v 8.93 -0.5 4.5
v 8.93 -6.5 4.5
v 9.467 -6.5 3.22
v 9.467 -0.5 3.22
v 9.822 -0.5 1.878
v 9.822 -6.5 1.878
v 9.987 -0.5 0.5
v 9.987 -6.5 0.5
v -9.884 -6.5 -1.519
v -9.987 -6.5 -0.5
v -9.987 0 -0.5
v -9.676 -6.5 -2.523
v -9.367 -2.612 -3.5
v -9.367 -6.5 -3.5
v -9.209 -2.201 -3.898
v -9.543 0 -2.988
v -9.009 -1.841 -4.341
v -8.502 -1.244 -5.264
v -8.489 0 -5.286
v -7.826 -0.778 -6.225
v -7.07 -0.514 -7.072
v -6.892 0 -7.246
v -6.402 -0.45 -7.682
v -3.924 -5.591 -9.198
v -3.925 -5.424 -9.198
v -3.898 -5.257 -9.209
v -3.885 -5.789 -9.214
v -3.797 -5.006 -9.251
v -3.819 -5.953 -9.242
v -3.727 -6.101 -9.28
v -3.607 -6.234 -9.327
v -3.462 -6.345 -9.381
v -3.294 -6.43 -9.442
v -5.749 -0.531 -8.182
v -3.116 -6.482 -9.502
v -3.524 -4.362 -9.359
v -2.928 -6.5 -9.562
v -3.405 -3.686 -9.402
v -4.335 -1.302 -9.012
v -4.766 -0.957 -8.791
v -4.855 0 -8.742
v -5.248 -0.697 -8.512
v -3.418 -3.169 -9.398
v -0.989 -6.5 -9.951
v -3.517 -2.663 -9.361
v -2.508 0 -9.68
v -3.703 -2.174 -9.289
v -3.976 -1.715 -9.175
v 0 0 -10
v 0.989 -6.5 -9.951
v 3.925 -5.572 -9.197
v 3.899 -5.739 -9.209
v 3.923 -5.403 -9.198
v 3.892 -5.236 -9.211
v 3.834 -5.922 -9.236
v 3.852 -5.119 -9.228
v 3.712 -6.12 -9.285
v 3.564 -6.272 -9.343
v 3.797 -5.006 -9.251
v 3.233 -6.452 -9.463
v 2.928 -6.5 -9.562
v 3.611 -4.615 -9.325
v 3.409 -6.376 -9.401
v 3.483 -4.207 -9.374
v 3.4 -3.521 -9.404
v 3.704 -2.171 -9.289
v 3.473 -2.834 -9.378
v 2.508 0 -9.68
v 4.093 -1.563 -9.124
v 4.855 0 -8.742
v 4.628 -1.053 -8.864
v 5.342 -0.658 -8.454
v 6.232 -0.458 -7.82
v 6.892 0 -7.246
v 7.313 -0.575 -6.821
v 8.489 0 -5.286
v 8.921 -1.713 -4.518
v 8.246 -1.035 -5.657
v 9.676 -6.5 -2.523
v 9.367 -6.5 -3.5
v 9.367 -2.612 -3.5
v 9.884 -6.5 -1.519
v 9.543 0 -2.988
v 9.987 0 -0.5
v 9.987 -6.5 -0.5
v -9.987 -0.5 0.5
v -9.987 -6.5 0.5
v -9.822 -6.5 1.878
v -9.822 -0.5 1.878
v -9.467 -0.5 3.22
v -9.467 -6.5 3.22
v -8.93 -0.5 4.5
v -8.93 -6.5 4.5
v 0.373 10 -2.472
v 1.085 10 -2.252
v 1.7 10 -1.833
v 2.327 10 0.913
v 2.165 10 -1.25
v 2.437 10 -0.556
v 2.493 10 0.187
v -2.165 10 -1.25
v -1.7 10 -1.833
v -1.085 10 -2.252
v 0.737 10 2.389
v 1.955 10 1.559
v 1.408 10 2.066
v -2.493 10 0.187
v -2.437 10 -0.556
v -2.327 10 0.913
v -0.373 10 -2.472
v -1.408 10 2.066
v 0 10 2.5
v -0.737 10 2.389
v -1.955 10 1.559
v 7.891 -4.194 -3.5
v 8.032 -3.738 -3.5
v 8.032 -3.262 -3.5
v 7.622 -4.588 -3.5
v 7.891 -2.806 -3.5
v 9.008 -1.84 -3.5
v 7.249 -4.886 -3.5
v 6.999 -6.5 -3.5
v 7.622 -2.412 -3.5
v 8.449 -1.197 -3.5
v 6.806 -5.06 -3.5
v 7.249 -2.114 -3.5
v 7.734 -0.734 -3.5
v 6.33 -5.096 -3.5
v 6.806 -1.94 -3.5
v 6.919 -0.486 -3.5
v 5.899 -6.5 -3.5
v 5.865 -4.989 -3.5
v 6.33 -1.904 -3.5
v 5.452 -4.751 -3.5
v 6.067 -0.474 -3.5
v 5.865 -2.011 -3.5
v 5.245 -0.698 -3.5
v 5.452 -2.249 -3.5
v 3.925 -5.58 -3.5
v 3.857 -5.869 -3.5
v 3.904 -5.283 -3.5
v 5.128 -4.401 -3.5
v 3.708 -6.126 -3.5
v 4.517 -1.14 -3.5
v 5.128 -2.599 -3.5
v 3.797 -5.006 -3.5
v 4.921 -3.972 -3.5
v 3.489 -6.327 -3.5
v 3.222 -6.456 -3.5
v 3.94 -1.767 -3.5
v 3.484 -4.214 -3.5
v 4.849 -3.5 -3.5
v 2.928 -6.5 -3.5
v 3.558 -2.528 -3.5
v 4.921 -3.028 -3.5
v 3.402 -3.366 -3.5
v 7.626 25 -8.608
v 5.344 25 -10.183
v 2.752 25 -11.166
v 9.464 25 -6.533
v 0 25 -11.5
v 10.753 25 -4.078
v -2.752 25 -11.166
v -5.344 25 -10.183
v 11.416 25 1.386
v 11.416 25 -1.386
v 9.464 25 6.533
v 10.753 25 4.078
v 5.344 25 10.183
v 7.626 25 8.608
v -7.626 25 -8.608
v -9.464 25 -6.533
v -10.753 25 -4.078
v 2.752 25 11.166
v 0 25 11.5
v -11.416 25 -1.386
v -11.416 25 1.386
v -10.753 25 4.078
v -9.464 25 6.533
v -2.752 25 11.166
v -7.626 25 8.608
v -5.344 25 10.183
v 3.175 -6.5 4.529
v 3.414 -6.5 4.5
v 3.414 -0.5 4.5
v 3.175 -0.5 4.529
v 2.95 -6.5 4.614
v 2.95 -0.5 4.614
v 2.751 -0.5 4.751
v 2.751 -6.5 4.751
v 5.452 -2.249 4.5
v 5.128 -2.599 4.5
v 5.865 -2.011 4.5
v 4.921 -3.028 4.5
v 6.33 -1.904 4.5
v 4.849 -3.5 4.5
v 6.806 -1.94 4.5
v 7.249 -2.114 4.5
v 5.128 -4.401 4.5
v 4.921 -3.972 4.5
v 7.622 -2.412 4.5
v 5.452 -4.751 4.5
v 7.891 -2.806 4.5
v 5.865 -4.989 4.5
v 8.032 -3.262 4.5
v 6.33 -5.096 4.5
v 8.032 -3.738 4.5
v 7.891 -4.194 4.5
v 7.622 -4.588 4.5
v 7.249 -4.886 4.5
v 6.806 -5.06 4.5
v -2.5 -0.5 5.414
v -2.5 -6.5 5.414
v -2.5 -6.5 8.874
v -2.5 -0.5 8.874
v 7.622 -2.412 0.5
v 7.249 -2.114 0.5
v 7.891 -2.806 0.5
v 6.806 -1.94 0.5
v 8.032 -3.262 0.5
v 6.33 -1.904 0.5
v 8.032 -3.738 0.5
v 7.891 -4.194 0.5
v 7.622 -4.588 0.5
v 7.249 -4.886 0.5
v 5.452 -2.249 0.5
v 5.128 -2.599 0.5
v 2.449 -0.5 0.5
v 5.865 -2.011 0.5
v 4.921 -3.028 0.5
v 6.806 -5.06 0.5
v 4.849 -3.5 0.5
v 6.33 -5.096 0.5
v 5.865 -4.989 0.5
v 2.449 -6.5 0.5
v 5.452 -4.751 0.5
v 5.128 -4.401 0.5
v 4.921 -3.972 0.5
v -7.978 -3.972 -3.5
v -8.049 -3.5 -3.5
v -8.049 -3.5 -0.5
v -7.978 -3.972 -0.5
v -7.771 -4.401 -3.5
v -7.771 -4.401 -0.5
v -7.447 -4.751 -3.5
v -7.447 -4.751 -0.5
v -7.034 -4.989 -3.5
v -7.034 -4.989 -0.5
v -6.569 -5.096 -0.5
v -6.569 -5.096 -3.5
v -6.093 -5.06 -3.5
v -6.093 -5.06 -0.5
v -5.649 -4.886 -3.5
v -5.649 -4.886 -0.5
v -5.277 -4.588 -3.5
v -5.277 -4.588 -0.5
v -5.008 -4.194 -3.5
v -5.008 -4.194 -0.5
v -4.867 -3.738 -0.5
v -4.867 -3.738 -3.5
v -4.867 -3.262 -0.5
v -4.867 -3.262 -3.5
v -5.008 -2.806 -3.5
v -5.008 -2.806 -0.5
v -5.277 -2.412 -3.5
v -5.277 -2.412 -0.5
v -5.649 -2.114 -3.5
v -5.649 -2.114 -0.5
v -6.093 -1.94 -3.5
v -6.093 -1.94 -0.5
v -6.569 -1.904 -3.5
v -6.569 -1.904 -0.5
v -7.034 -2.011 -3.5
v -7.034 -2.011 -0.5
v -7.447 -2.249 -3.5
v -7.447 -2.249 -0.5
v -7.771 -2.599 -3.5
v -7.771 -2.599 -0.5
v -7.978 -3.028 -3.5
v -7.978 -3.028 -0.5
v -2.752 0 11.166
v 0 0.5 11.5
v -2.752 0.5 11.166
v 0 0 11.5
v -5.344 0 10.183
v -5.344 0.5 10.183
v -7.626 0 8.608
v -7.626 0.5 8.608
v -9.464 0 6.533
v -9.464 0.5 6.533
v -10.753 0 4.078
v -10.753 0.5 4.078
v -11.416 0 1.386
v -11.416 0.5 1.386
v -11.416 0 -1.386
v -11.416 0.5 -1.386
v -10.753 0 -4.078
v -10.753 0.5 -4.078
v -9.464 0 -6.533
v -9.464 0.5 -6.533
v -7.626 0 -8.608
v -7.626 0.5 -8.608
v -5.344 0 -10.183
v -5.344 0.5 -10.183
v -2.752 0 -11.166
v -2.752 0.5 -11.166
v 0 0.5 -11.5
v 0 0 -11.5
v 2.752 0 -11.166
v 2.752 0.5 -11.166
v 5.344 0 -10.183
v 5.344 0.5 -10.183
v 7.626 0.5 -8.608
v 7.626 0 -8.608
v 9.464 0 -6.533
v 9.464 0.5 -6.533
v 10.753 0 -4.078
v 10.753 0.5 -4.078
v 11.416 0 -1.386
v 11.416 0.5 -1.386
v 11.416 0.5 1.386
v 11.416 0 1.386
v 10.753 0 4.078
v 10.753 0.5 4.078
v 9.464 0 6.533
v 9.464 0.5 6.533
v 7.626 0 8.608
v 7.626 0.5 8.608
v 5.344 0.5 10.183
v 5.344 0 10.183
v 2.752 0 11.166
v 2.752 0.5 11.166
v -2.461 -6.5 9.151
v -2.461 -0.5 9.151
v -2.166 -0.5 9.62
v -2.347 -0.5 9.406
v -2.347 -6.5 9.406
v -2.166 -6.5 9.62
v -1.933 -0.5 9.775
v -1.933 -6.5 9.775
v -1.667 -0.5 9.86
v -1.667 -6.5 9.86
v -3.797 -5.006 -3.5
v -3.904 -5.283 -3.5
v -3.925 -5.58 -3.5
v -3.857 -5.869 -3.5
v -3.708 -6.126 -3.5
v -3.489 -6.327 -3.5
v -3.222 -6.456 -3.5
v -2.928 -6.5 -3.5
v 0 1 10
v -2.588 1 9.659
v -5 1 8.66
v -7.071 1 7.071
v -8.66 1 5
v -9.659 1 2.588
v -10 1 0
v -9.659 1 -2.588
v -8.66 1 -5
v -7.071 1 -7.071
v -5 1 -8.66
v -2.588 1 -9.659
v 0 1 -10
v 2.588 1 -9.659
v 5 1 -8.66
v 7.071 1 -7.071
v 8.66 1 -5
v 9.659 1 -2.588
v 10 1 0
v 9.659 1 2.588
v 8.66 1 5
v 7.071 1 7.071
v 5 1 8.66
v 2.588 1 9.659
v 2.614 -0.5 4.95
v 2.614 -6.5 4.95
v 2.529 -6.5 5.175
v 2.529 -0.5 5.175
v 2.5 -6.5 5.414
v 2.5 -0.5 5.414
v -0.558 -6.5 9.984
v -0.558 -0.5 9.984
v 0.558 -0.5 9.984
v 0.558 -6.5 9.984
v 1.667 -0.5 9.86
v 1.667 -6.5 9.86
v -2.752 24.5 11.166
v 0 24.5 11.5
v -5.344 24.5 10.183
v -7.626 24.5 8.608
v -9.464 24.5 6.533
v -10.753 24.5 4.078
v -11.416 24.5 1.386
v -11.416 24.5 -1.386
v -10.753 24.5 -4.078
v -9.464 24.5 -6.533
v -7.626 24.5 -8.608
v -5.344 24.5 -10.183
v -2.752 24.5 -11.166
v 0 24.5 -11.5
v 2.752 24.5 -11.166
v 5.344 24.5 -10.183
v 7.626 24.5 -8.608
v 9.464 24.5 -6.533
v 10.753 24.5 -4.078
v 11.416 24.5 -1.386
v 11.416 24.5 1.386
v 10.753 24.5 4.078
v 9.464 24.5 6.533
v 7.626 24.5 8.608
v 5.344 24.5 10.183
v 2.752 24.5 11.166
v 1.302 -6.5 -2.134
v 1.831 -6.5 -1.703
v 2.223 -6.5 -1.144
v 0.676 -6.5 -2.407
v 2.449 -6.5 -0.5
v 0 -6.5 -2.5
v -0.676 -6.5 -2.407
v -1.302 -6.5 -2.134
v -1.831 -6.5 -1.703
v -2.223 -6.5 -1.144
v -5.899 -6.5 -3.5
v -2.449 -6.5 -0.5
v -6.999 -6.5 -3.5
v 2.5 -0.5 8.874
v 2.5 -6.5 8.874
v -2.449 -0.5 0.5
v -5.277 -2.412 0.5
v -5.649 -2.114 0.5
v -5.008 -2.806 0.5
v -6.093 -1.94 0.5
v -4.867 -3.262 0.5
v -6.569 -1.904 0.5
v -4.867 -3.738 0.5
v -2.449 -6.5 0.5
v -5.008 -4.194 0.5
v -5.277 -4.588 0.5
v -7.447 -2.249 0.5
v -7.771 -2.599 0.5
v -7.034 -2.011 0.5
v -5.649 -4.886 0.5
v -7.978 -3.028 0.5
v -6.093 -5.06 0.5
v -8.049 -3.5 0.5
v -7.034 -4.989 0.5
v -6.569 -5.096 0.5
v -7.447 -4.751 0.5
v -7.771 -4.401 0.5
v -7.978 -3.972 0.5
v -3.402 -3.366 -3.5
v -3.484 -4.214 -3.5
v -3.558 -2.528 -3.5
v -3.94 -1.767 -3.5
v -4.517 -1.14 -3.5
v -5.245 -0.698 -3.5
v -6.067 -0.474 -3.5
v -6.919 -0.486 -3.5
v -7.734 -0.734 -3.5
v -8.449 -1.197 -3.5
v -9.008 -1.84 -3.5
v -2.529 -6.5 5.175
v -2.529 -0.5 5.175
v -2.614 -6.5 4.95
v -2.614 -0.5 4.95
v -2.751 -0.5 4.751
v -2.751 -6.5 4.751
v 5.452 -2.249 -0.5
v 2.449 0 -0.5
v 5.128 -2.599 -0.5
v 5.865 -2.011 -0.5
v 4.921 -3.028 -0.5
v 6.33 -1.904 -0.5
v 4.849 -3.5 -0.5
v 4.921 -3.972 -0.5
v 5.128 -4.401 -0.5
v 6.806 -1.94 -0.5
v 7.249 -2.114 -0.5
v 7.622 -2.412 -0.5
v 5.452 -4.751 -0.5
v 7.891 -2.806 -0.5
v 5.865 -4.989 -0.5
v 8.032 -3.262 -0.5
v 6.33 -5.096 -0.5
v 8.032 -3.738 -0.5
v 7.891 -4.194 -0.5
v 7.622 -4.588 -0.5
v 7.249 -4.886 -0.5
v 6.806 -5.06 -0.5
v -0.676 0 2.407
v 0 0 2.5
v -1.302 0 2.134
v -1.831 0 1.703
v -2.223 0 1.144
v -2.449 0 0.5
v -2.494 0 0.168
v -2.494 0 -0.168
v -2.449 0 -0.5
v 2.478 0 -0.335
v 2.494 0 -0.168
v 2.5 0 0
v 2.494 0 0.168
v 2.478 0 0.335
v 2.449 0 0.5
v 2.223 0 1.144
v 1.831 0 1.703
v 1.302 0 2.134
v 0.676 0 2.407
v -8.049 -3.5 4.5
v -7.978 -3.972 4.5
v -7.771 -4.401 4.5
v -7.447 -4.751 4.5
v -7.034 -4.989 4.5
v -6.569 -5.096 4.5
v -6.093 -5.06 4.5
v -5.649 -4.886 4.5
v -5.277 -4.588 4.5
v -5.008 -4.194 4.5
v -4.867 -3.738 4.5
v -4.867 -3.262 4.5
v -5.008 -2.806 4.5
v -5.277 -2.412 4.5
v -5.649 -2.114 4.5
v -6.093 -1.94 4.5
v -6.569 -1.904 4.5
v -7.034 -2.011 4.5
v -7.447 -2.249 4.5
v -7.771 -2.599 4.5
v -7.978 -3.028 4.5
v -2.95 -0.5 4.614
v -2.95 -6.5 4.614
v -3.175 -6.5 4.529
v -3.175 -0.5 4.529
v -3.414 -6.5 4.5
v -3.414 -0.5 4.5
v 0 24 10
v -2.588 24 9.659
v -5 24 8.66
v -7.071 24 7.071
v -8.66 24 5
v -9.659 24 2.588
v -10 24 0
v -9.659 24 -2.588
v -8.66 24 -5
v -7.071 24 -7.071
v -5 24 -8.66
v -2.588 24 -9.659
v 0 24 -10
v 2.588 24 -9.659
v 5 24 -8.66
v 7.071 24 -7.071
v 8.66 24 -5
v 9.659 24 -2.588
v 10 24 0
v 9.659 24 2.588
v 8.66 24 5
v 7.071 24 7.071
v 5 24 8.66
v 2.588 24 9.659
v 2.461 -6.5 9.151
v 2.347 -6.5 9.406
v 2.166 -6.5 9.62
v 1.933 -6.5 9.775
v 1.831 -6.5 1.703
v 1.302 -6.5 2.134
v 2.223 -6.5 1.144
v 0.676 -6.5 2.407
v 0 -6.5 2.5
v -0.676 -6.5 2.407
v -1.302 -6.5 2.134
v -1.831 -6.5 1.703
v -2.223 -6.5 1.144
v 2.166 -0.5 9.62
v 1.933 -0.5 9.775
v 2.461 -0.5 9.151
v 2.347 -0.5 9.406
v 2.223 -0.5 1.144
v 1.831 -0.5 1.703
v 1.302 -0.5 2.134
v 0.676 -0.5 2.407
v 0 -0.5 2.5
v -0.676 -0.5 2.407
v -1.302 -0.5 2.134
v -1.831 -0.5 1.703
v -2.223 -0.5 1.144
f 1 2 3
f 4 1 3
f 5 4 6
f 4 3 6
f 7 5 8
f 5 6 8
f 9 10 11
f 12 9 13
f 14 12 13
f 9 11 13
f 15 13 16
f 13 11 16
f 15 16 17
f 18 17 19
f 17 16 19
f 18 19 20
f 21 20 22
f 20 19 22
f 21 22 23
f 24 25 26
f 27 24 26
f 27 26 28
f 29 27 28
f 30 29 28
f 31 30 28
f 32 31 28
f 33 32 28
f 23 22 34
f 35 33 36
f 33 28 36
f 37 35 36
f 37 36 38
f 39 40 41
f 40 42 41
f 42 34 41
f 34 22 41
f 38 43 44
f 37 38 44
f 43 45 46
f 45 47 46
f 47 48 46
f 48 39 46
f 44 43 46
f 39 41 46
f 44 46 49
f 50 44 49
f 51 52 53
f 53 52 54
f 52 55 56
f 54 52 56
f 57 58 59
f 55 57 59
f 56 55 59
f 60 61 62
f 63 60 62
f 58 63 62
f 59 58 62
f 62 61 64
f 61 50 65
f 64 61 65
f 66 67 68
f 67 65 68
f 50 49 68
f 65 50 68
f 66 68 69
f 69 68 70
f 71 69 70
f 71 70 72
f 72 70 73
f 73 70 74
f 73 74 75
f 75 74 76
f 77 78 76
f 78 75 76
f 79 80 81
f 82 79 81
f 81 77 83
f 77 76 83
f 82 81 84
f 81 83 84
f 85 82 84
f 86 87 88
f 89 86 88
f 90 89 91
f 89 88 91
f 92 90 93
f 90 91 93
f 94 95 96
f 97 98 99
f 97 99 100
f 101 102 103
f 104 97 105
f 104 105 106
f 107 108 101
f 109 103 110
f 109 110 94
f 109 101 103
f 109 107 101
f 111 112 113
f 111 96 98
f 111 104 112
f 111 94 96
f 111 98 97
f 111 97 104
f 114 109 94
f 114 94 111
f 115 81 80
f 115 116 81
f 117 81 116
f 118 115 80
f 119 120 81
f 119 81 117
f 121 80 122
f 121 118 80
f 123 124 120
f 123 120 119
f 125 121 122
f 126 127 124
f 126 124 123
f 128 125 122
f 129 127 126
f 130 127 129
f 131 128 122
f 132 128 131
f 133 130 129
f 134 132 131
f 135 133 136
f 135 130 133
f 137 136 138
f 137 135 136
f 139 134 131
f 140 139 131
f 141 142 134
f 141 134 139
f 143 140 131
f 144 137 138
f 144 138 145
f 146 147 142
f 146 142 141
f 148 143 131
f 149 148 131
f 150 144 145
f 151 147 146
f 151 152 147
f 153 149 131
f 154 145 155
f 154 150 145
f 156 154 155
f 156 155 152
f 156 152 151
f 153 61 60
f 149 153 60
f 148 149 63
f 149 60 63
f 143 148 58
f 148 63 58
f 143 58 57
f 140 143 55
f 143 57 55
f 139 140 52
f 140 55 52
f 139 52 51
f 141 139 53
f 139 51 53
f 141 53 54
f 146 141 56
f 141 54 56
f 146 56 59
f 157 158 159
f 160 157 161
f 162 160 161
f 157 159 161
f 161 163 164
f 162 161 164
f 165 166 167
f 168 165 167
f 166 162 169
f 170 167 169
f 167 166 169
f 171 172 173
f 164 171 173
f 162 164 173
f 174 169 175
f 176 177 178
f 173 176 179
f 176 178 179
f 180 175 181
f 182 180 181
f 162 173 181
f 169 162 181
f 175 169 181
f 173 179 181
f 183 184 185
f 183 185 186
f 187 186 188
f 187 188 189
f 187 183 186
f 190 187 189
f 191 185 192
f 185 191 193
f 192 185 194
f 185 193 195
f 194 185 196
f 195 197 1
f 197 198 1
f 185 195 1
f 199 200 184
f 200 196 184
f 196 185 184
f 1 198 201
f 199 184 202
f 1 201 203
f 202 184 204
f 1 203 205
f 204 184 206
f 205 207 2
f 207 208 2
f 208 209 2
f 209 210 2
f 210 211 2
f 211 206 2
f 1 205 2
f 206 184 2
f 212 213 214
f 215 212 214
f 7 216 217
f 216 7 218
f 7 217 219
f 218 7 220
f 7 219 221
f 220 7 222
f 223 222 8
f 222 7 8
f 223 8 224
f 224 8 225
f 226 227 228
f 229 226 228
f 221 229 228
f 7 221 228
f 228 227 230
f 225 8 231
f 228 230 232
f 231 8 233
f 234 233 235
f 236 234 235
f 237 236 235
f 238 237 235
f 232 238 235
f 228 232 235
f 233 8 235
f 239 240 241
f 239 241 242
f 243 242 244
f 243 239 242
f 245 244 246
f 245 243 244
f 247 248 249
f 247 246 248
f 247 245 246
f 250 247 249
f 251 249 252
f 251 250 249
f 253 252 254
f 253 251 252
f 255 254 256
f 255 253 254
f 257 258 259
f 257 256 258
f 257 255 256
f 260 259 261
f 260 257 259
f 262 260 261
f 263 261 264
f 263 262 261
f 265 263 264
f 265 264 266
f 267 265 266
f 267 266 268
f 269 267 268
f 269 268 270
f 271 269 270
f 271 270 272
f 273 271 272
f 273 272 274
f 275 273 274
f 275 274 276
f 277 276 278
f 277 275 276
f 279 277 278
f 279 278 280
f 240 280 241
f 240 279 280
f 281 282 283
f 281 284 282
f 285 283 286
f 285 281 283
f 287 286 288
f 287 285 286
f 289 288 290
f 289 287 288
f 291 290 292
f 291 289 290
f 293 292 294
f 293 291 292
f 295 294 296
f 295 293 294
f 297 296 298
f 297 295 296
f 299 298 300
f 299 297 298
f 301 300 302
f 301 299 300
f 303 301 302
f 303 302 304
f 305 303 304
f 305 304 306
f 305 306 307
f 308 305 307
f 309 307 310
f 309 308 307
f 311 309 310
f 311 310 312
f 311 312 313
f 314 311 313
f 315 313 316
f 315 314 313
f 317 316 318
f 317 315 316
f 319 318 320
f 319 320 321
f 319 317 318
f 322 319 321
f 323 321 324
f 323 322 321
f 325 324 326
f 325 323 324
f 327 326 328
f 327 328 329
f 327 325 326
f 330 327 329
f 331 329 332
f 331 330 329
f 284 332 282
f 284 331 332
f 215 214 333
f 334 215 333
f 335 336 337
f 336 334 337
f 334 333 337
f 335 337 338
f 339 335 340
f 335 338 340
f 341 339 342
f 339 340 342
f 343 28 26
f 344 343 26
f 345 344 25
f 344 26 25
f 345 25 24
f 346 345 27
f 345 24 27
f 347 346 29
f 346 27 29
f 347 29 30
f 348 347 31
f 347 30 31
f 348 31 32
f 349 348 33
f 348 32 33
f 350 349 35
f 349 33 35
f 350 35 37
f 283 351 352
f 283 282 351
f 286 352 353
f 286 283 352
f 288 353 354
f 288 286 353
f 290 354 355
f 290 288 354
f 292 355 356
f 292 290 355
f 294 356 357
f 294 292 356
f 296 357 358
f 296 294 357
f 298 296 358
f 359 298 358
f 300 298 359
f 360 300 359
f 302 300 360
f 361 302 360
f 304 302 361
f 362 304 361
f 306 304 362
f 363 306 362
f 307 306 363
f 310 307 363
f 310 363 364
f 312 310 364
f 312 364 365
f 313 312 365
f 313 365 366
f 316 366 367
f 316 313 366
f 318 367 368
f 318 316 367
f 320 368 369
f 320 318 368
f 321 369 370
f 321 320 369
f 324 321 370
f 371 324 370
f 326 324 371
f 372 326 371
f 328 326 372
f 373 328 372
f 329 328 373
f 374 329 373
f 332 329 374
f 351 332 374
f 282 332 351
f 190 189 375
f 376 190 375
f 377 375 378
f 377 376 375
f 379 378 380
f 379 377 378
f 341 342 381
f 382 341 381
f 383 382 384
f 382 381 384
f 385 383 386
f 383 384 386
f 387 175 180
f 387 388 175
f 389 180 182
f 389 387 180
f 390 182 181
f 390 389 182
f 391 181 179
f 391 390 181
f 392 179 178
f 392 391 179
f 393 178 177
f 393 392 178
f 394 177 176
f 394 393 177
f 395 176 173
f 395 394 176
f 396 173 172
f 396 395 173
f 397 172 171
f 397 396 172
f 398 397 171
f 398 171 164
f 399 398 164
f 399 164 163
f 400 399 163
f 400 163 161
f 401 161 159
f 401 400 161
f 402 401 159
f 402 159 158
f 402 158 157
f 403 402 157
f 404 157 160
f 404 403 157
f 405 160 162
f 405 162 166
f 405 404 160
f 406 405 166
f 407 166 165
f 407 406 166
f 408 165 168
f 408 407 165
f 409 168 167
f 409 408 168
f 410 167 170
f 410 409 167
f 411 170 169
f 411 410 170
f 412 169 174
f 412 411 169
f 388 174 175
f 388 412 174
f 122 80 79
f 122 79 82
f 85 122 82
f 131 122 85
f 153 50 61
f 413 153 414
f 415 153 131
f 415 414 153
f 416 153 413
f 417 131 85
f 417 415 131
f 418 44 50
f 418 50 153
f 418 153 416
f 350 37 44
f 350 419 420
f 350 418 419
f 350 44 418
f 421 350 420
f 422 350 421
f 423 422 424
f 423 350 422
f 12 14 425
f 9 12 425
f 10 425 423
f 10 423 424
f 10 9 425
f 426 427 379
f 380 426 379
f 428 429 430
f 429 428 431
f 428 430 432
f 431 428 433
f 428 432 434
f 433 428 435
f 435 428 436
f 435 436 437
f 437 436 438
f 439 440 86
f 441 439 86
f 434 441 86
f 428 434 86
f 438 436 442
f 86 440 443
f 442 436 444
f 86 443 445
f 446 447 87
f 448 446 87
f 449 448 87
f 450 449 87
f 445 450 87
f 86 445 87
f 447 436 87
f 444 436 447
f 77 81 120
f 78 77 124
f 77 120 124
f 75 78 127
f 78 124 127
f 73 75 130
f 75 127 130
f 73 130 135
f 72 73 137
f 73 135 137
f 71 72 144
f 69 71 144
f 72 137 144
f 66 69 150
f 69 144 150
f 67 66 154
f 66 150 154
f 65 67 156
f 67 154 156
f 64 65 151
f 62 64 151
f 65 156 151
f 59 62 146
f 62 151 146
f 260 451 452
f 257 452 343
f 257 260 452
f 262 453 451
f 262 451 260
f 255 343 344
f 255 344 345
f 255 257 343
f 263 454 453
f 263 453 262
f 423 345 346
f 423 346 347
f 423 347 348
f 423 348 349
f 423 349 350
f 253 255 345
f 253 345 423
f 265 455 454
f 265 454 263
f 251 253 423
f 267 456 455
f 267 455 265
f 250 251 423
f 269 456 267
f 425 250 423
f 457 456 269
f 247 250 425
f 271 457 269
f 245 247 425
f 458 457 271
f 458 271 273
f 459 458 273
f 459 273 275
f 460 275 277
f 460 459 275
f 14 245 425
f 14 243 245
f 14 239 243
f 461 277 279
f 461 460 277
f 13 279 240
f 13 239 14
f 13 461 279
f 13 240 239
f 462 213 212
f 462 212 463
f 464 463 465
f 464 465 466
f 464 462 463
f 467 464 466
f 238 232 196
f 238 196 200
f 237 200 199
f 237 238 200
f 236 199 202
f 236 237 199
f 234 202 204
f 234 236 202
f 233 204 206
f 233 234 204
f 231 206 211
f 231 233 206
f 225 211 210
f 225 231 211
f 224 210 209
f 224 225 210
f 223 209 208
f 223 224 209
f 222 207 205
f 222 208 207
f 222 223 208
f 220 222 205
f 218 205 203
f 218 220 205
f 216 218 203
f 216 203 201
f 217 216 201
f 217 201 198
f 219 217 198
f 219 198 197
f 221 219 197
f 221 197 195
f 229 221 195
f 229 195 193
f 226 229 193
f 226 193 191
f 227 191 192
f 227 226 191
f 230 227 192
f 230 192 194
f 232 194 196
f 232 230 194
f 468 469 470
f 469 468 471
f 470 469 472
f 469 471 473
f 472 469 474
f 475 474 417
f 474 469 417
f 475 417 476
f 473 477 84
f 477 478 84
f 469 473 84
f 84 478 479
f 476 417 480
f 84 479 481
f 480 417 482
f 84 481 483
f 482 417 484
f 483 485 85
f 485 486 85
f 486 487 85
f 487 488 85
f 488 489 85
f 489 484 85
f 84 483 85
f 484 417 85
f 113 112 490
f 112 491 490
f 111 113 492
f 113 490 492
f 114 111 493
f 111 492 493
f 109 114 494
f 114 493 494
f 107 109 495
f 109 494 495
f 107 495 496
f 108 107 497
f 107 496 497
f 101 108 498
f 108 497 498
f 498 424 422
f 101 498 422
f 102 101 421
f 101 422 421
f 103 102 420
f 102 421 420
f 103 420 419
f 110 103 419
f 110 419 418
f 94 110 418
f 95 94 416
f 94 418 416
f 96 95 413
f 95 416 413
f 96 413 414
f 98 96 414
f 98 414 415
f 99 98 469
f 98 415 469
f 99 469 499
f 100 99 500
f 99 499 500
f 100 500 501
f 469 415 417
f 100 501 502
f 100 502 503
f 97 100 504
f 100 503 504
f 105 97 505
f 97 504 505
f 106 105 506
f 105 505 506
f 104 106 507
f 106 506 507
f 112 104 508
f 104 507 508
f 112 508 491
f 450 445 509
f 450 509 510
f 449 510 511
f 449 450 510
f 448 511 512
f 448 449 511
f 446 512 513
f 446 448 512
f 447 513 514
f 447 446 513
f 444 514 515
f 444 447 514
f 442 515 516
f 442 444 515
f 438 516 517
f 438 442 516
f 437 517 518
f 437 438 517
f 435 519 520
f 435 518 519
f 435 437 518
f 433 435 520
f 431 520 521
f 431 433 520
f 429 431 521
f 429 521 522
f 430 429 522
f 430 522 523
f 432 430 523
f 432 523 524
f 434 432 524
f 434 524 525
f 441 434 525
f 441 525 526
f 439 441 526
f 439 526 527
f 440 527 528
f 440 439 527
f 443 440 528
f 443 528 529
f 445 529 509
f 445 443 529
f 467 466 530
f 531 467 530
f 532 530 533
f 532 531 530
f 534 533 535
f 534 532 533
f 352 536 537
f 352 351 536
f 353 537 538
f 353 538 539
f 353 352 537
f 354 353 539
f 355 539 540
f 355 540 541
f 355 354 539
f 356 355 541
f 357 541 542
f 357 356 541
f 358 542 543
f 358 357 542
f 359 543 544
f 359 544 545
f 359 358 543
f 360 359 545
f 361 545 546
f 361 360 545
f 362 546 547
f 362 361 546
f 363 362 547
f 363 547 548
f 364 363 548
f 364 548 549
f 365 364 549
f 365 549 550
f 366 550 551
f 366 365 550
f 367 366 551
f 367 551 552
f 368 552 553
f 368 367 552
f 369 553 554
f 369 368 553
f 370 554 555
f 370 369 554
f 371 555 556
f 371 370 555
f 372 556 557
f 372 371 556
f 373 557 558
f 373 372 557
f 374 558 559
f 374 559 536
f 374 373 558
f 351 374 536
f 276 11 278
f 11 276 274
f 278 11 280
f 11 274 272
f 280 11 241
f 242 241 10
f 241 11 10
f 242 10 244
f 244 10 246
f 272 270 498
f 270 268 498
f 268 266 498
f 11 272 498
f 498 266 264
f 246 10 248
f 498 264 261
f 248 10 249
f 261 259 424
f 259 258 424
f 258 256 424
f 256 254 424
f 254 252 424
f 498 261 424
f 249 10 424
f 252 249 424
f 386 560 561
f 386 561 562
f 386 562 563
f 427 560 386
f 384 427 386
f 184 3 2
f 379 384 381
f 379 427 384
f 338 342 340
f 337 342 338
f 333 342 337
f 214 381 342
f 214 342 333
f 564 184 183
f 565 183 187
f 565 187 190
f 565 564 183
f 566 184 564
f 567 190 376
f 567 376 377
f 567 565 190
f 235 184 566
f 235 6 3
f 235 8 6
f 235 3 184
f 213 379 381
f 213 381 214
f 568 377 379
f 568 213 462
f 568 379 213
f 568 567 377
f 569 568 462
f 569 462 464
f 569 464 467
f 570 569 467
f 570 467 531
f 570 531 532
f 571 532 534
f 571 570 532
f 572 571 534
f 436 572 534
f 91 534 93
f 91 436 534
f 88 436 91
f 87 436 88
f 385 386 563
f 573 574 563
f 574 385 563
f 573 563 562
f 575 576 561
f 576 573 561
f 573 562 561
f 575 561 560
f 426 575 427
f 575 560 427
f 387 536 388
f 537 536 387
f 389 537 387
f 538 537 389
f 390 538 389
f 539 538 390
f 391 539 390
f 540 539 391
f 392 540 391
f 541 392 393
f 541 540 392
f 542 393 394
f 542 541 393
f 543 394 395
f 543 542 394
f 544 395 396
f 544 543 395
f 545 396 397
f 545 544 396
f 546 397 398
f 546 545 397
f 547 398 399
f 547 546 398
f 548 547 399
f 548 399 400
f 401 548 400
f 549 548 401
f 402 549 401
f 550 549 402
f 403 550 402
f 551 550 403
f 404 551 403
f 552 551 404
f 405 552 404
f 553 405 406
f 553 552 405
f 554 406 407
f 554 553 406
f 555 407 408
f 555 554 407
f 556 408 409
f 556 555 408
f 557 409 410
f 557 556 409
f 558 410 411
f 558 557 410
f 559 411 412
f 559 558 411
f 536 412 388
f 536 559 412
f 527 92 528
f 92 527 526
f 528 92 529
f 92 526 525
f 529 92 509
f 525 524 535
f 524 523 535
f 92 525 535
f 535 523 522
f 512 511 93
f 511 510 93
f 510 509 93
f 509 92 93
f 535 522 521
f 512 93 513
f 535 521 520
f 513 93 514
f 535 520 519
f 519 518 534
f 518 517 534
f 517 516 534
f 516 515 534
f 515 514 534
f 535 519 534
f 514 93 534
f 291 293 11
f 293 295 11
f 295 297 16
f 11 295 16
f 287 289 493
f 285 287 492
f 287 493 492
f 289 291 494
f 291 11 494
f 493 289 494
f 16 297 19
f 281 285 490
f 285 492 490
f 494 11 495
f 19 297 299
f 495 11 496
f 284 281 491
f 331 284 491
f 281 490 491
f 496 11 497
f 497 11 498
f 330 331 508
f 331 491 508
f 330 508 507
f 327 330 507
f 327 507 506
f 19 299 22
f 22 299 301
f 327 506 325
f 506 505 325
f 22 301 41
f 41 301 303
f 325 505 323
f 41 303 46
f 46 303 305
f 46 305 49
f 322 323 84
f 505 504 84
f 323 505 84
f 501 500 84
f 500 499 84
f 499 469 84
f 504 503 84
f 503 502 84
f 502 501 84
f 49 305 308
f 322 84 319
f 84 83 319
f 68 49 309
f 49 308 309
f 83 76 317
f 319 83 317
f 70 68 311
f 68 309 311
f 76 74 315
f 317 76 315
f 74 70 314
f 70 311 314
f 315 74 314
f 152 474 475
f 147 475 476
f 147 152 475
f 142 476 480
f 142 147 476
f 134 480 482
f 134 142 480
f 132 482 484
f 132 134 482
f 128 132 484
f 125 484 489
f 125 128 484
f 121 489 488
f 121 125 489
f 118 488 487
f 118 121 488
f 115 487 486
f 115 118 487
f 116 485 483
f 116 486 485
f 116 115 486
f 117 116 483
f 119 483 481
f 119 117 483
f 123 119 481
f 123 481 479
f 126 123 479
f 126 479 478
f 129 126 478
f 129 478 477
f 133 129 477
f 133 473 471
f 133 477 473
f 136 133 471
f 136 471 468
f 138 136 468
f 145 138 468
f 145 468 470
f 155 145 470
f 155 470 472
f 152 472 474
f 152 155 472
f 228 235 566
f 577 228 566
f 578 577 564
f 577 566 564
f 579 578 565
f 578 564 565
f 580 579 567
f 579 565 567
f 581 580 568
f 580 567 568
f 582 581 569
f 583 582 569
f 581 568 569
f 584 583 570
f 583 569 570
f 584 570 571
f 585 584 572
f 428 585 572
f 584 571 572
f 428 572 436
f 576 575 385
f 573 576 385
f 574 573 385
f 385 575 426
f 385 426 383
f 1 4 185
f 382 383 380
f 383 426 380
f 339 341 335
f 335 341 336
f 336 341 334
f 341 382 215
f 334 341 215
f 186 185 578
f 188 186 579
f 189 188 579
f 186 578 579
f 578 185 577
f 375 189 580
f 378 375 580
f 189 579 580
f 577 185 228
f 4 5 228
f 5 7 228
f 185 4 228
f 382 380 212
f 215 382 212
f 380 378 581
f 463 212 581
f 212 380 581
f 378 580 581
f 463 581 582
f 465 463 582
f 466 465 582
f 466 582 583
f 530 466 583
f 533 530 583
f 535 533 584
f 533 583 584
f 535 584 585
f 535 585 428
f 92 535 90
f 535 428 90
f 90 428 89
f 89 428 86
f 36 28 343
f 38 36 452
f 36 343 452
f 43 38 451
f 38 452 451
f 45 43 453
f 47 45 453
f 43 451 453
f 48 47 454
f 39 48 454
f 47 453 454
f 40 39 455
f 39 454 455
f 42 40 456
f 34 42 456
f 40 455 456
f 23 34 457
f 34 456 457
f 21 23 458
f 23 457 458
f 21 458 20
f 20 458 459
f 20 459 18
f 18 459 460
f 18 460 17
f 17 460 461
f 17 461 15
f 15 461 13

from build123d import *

# Parameters (mm, degrees)
CUT_EXTRUDE1_DEPTH      = 6.5
INTERSECT1_START        = -6.5
INTERSECT1_DEPTH        = 6
INTERSECT1_2_DEPTH      = 6.5
CUT_EXTRUDE2_DEPTH      = 1
CUT_EXTRUDE2_DEPTH_BACK = 31.020826105
SKETCH5_R               = 1.6
CUT_EXTRUDE3_START      = -3
SKETCH5_3_R             = 3.05
SKETCH5_3_R_2           = 1.6
CUT_EXTRUDE3_DEPTH      = 28.020826105
SKETCH5_4_R             = 1.6
CUT_EXTRUDE4_DEPTH      = 31.020826105
CUT_EXTRUDE5_DEPTH      = 6
CHAMFER1_SIZE           = 0.5
FILLET1_R               = 1
FILLET2_R               = 1
INTERSECT2_START        = -10.0000001
INTERSECT2_DEPTH        = 6.5000001


with BuildPart() as part:
    # Sketch2 → Revolve1 (revolve)
    with BuildSketch(Plane.XY, mode=Mode.PRIVATE) as revolve1_sk:
        Polygon((2.5, 0), (2.5, 10), (0, 10), (0, 25), (2.5, 25), (11.5, 25), (11.5, 24.5), (10, 24), (10, 1), (11.5, 0.5), (11.5, 0), (10, 0), (10, -0.5), (10, -6.5), (2.5, -6.5), align=None)
    revolve(revolve1_sk.sketch.rotate(Axis((0, 25, 0), (0, -1, 0)), 90), axis=Axis((0, 25, 0), (0, -1, 0)))

    # Sketch3 → Cut-Extrude1 (cut)
    with BuildSketch(Plane.XZ.offset(6.5)):
        with BuildLine():
            Line((-9.987492178, -0.5), (-2.449489743, -0.5))
            ThreePointArc((-2.449489743, -0.5), (-2.5, 0), (-2.449489743, 0.5))
            Line((-2.449489743, 0.5), (-9.987492178, 0.5))
            ThreePointArc((-9.987492178, 0.5), (-10, 0), (-9.987492178, -0.5))
        make_face()
        with BuildLine():
            ThreePointArc((2.5, 0), (2.487340383, -0.251272405), (2.449489743, -0.5))
            Line((2.449489743, -0.5), (9.987492178, -0.5))
            ThreePointArc((9.987492178, -0.5), (9.996872555, -0.250078211), (10, 0))
            ThreePointArc((10, 0), (9.996872555, 0.250078211), (9.987492178, 0.5))
            Line((9.987492178, 0.5), (2.449489743, 0.5))
            ThreePointArc((2.449489743, 0.5), (2.487340383, 0.251272405), (2.5, 0))
        make_face()
    extrude(amount=-CUT_EXTRUDE1_DEPTH, mode=Mode.SUBTRACT)

    # Intersect1 2 outline → Intersect1 2 (cut)
    with BuildSketch(Plane(origin=(0, 0, 0), x_dir=(1, 0, 0), z_dir=(0, 1, 0)).offset(INTERSECT1_START)):
        with BuildLine():
            Line((-2.449489743, -0.5), (-9.987492178, -0.5))
            ThreePointArc((-9.987492178, -0.5), (0, -10), (9.987492178, -0.5))
            Line((9.987492178, -0.5), (2.449489743, -0.5))
            ThreePointArc((2.449489743, -0.5), (0, -2.5), (-2.449489743, -0.5))
        make_face()
    extrude(amount=INTERSECT1_2_DEPTH, mode=Mode.SUBTRACT)

    # Sketch5 → Cut-Extrude2 (cut, two sides: drawn at the far end of the back side and taken through both)
    with BuildSketch(Plane.XY.offset(-0.5).offset(-CUT_EXTRUDE2_DEPTH_BACK)):
        with Locations(Location((-6.449489743, -3.5, 0), (0, 0, 180))):
            Circle(SKETCH5_R)
        with Locations(Location((6.449489743, -3.5, 0), (0, 0, 180))):
            Circle(SKETCH5_R)
    extrude(amount=CUT_EXTRUDE2_DEPTH + CUT_EXTRUDE2_DEPTH_BACK, mode=Mode.SUBTRACT)

    # Sketch5<3> → Cut-Extrude3 (cut, through all)
    # profile 1 of 2: a face of its own
    with BuildSketch(Plane.XY.offset(-0.5).offset(CUT_EXTRUDE3_START)):
        with Locations((-6.449489743, -3.5)):
            Circle(SKETCH5_3_R)
        with Locations((-6.449489743, -3.5)):
            Circle(SKETCH5_3_R_2, mode=Mode.SUBTRACT)
    # profile 2 of 2: a face of its own
    with BuildSketch(Plane.XY.offset(-0.5).offset(CUT_EXTRUDE3_START)):
        with Locations((6.449489743, -3.5)):
            Circle(SKETCH5_3_R)
        with Locations(Location((6.449489743, -3.5, 0), (0, 0, 180))):
            Circle(SKETCH5_3_R_2, mode=Mode.SUBTRACT)
    extrude(amount=-CUT_EXTRUDE3_DEPTH, mode=Mode.SUBTRACT)

    # Fillet2
    # the kernel refuses this fillet: 1 mm, written as the material it takes off along each edge
    with BuildSketch(Plane(origin=(5.899489743, -6.5, -15.503701116), x_dir=(-0.8151459123720453, 0.5792556789045281, 0), z_dir=(0, 0, 1))) as fillet2_piece_1:
        with BuildLine():
            CenterArc((3.001639729, 0.906238807), FILLET2_R, 125.398208072, 119.592441671)
            Line((2.42238405, 1.721384719), (0, 0))
            ThreePointArc((0, 0), (1.289436785, 0.285971639), (2.57887357, 0))
        make_face()
    extrude(amount=12.003701116, mode=Mode.SUBTRACT)
    with BuildSketch(Plane(origin=(6.999489743, -6.5, -14.571224371), x_dir=(0.8151459123720456, 0.5792556789045277, 0), z_dir=(0, 0, 1))) as fillet2_piece_2:
        with BuildLine():
            CenterArc((3.001639729, -0.906238807), FILLET2_R, 115.009350257, 119.592441671)
            Line((2.42238405, -1.721384719), (0, 0))
            ThreePointArc((0, 0), (1.289436785, -0.285971639), (2.57887357, 0))
        make_face()
    extrude(amount=11.071224371, mode=Mode.SUBTRACT)
    with BuildSketch(Plane(origin=(-6.999489743, -6.5, -14.571224371), x_dir=(-0.8151459123720448, 0.5792556789045287, 0), z_dir=(0, 0, 1))) as fillet2_piece_3:
        with BuildLine():
            CenterArc((3.001639729, 0.906238807), FILLET2_R, 125.398208072, 119.592441671)
            Line((2.42238405, 1.721384719), (0, 0))
            ThreePointArc((0, 0), (1.289436785, 0.285971639), (2.57887357, 0))
        make_face()
    extrude(amount=11.071224371, mode=Mode.SUBTRACT)
    with BuildSketch(Plane(origin=(-5.899489743, -6.5, -15.503701116), x_dir=(0.8151459123720447, 0.579255678904529, 0), z_dir=(0, 0, 1))) as fillet2_piece_4:
        with BuildLine():
            CenterArc((3.001639729, -0.906238807), FILLET2_R, 115.009350257, 119.592441671)
            Line((2.42238405, -1.721384719), (0, 0))
            ThreePointArc((0, 0), (1.289436785, -0.285971639), (2.57887357, 0))
        make_face()
    extrude(amount=12.003701116, mode=Mode.SUBTRACT)

    # Intersect2: read off the stored shape, not the designer's step
    # Intersect2 outline → Intersect2 (cut)
    with BuildSketch(Plane.XY.offset(INTERSECT2_START)):
        with BuildLine():
            ThreePointArc((-9.101644142, -5.006179618), (-9.251694739, -4.704220561), (-9.367496998, -4.387543611))
            Line((-9.367496998, -4.387543611), (-9.789533465, -3))
            Line((-9.789533465, -3), (-11, -3))
            Line((-11, -3), (-11, -7.533475387))
            Line((-11, -7.533475387), (-9.367496998, -6.297203197))
            ThreePointArc((-9.367496998, -6.297203197), (-8.991758319, -5.70168832), (-9.101644142, -5.006179618))
        make_face()
        with BuildLine():
            Line((11, -3), (9.789533466, -3))
            Line((9.789533466, -3), (9.367496998, -4.387543611))
            ThreePointArc((9.367496998, -4.387543611), (9.251696278, -4.70421698), (9.101647992, -5.00617284))
            ThreePointArc((9.101647992, -5.00617284), (8.991758319, -5.70168832), (9.367496998, -6.297203197))
            Line((9.367496998, -6.297203197), (11, -7.533475387))
            Line((11, -7.533475387), (11, -3))
        make_face()
    extrude(amount=INTERSECT2_DEPTH, mode=Mode.SUBTRACT)


with BuildPart() as body_2:
    # Intersect1: read off the stored shape, not the designer's step
    # Intersect1 outline → Intersect1 (new body)
    with BuildSketch(Plane(origin=(0, 0, 0), x_dir=(1, 0, 0), z_dir=(0, 1, 0)).offset(INTERSECT1_START)):
        with BuildLine():
            ThreePointArc((2.449489743, -0.5), (0, -2.5), (-2.449489743, -0.5))
            Line((-2.449489743, -0.5), (-9.987492178, -0.5))
            ThreePointArc((-9.987492178, -0.5), (0, -10), (9.987492178, -0.5))
            Line((9.987492178, -0.5), (2.449489743, -0.5))
        make_face()
    extrude(amount=INTERSECT1_DEPTH)

    # Sketch5<4> → Cut-Extrude4 (cut, through all)
    with BuildSketch(Plane.XY.offset(-0.5)):
        with Locations(Location((-6.449489743, -3.5, 0), (0, 0, 180))):
            Circle(SKETCH5_4_R)
        with Locations(Location((6.449489743, -3.5, 0), (0, 0, 180))):
            Circle(SKETCH5_4_R)
    extrude(amount=CUT_EXTRUDE4_DEPTH, mode=Mode.SUBTRACT)

    # Sketch7 → Cut-Extrude5 (cut)
    with BuildSketch(Plane.XZ.offset(6.5)):
        with BuildLine():
            ThreePointArc((-2.5, 9.682458366), (-6.275135506, 7.786056408), (-8.93028555, 4.5))
            Line((-8.93028555, 4.5), (-2.5, 4.5))
            Line((-2.5, 4.5), (-2.5, 9.682458366))
        make_face()
        with BuildLine():
            Line((2.5, 9.682458366), (2.5, 4.5))
            Line((2.5, 4.5), (8.93028555, 4.5))
            ThreePointArc((8.93028555, 4.5), (6.275135506, 7.786056408), (2.5, 9.682458366))
        make_face()
    extrude(amount=-CUT_EXTRUDE5_DEPTH, mode=Mode.SUBTRACT)

    # Chamfer1
    chamfer1_edges = [body_2.edges().sort_by_distance(p)[0] for p in [
        (-2.5, -3.5, 4.5),
        (2.5, -3.5, 4.5),
    ]]
    chamfer(chamfer1_edges, length=CHAMFER1_SIZE)

    # Fillet1
    # the kernel refuses this fillet: 1 mm, written as the material it adds along each edge
    with BuildSketch(Plane(origin=(3, -6.5, 4.5), x_dir=(1, 0, 0), z_dir=(0, 1, 0)), Plane(origin=(2.5, -6.5, 5), x_dir=(0.7071067811865481, 0, -0.707106781186547), z_dir=(0, 1, 0)), Plane(origin=(-2.5, -6.5, 5), x_dir=(0, 0, 1), z_dir=(0, 1, 0)), Plane(origin=(-3, -6.5, 4.5), x_dir=(0.7071067811865481, 0, 0.707106781186547), z_dir=(0, 1, 0))) as fillet1_piece_1:
        with BuildLine():
            CenterArc((FILLET1_R * 0.414213562373, -FILLET1_R), FILLET1_R, 90, 45)
            Line((-FILLET1_R * 0.292893218813, -FILLET1_R * 0.292893218813), (0, 0))
            Line((0, 0), (FILLET1_R * 0.414213562373, 0))
        make_face()
    extrude(amount=6)
    # the kernel refuses this fillet: 1 mm, written as the material it takes off along each edge
    with BuildSketch(Plane(origin=(-2.5, -8.630159487, 9.682458366), x_dir=(0.9780175364256274, 0, 0.20852265690794025), z_dir=(0, 1, 0))) as fillet1_2_piece_1:
        with BuildLine():
            CenterArc((0.809460605, 0.999092072), FILLET1_R, 192.035790207, 80.405931773)
            Line((-0.168556932, 0.790569415), (0, 0))
            ThreePointArc((0, 0), (0.426031897, -0.009079281), (0.852063795, 0))
        make_face()
    extrude(amount=10.260318973, mode=Mode.SUBTRACT)
    with BuildSketch(Plane(origin=(2.5, -8.630159487, 9.682458366), x_dir=(0, 0, -1), z_dir=(0, 1, 0))) as fillet1_2_piece_2:
        with BuildLine():
            CenterArc((0.808338691, 1), FILLET1_R, 189.594068227, 80.405931773)
            ThreePointArc((-0.177674606, 0.833333333), (-0.097716999, 0.414773431), (0, 0))
            Line((0, 0), (0.808338691, 0))
        make_face()
    extrude(amount=10.260318973, mode=Mode.SUBTRACT)


solid = Compound([part.part, body_2.part])
